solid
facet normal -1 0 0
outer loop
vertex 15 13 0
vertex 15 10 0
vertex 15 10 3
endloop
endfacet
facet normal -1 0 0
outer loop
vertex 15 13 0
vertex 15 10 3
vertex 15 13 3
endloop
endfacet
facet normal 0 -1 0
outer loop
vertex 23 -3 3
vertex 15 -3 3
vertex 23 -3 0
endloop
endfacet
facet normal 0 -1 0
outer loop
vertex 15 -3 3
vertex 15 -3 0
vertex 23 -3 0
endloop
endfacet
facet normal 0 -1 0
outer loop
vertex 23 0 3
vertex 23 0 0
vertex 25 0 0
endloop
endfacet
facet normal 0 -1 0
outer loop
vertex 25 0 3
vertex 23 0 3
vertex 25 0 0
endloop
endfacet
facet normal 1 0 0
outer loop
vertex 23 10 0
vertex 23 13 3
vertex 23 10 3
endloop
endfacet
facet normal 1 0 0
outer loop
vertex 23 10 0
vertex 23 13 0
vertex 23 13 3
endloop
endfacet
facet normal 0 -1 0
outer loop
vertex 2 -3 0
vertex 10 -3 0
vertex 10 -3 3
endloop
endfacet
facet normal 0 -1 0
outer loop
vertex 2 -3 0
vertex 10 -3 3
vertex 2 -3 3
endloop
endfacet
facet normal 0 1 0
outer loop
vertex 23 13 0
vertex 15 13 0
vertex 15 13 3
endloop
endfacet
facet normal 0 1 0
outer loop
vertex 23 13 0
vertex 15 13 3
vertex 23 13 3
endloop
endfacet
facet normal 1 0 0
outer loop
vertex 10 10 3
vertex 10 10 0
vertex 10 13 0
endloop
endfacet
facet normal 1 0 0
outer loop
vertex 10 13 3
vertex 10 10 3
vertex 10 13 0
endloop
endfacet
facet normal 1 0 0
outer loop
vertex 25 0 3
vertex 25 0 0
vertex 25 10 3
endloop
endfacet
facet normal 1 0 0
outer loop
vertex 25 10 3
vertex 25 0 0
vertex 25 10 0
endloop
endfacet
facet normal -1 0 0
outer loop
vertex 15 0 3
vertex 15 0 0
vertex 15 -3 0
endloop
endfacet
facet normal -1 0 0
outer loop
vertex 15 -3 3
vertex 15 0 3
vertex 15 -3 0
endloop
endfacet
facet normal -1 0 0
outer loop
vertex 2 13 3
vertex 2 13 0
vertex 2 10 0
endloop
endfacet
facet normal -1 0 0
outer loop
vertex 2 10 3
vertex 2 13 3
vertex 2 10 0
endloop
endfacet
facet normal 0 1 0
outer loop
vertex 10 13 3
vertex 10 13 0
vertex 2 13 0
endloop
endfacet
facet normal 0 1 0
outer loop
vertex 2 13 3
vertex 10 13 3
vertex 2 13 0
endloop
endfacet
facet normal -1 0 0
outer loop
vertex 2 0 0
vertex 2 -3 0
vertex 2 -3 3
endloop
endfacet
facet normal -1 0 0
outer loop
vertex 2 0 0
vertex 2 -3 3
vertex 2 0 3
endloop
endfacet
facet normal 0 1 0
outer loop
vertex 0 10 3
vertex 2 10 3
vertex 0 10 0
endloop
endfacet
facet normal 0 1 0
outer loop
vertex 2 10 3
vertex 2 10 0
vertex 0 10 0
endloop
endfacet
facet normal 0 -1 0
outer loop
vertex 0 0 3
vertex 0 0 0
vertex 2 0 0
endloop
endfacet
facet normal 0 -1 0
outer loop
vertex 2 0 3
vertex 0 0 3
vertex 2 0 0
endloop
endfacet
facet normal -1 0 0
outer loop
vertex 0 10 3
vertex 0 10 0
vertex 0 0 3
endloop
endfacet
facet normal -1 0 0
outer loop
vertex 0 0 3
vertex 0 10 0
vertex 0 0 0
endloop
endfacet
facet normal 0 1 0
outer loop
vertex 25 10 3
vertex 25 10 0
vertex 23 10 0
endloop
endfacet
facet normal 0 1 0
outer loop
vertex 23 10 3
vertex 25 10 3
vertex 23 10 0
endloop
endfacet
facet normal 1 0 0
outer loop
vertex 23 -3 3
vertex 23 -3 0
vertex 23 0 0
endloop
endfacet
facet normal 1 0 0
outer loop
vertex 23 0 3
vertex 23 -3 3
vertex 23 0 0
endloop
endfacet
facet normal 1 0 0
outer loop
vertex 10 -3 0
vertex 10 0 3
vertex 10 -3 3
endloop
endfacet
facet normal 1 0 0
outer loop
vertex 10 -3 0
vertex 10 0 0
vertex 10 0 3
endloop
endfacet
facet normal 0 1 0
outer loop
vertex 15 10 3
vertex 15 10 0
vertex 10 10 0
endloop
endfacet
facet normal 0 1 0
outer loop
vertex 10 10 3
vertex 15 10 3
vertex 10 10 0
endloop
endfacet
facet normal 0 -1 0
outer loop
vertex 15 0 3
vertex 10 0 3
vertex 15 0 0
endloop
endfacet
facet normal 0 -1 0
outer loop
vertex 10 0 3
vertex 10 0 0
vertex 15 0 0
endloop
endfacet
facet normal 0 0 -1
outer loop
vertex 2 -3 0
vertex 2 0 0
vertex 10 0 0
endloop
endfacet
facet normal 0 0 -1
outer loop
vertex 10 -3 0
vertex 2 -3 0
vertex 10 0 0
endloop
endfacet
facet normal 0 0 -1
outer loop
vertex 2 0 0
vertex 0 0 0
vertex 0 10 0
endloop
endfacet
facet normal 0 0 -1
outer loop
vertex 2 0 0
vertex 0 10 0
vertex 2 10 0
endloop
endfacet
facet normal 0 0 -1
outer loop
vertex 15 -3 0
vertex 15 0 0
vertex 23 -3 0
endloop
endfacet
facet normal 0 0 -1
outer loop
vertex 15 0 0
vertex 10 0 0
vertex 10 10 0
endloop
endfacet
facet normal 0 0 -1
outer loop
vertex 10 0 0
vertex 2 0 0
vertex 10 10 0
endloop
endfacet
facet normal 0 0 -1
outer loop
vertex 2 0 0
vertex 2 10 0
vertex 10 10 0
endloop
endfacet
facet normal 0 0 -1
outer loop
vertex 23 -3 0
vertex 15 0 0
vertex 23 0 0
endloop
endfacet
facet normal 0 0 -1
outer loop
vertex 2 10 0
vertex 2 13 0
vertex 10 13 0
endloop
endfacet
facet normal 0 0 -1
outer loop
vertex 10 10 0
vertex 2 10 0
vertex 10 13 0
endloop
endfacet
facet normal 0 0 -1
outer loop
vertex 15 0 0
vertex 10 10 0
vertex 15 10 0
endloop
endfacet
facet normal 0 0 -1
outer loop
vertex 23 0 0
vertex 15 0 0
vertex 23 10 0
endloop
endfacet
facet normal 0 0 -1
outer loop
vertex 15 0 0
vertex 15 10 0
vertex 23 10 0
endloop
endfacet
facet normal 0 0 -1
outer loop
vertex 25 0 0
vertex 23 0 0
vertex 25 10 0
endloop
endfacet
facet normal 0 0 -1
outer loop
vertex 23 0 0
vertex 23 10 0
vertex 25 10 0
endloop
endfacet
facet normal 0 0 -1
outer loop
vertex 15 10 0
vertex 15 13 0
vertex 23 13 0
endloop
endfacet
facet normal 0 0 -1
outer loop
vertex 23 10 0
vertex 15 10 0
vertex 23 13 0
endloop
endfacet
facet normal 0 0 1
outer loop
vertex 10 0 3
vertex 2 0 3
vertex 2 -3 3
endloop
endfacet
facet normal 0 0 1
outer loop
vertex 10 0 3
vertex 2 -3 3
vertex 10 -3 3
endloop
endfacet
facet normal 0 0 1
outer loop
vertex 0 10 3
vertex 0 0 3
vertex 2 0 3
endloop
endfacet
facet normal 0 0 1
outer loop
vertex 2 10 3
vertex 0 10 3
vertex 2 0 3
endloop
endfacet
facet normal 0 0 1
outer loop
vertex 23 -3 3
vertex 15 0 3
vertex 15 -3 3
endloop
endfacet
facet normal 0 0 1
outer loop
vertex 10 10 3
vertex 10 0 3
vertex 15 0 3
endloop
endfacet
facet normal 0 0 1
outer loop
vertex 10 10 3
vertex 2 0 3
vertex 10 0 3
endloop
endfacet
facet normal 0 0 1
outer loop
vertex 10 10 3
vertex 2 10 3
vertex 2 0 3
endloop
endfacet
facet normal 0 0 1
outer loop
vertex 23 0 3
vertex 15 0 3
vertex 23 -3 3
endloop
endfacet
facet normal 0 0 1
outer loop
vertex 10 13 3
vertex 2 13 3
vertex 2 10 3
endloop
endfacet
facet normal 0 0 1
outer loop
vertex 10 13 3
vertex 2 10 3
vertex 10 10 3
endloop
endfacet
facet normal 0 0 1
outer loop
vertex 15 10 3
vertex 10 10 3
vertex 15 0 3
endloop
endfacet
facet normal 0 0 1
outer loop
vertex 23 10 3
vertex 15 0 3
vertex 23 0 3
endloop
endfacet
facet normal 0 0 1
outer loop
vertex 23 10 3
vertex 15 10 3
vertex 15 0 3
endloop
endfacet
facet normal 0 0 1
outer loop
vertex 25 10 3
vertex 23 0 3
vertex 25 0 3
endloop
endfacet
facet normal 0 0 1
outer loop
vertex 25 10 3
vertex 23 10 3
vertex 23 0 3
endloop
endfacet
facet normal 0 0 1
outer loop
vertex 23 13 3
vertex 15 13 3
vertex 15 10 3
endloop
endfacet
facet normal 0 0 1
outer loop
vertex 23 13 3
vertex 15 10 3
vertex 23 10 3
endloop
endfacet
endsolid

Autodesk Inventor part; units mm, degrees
ref_plane "YZ Plane" through (0, 0, 0) normal (1, 0, 0) x (0, 1, 0)
ref_plane "XZ Plane" through (0, 0, 0) normal (0, 1, 0) x (-1, 0, 0)
ref_plane "XY Plane" through (0, 0, 0) normal (0, 0, 1) x (1, 0, 0)
sketch "Sketch1" plane through (0, 0, 0) normal (0, 0, 1) x (1, 0, 0)
  line L0 (0, 0) -> (25, 0)
  line L1 (25, 0) -> (25, 10)
  line L2 (25, 10) -> (0, 10)
  line L3 (0, 10) -> (0, 0)
  line L4 (2, 0) -> (10, 0)
  line L5 (10, 0) -> (10, -3)
  line L6 (10, -3) -> (2, -3)
  line L7 (2, -3) -> (2, 0)
  line L8 (12.5, 0) -> (12.5, 10) construction
  line L9 (0, 5) -> (25, 5) construction
  line L10 (15, 0) -> (15, -3)
  line L11 (15, -3) -> (23, -3)
  line L12 (23, -3) -> (23, 0)
  line L13 (10, 10) -> (10, 13)
  line L14 (10, 13) -> (2, 13)
  line L15 (2, 13) -> (2, 10)
  line L16 (15, 13) -> (23, 13)
  line L17 (15, 10) -> (15, 13)
  line L18 (23, 13) -> (23, 10)
  point P0 (23, 0)
  point P1 (15, 0)
  point P2 (10, 0)
  point P3 (15, 10)
  point P4 (23, 10)
  dimension "d0" = 25
  dimension "d1" = 10
  dimension "d5" = 3
  dimension "d6" = 2
  dimension "d7" = 8
extrude "Extrusion1" add sketch "Sketch1" along normal blind 3
properties part number "protector hal"
